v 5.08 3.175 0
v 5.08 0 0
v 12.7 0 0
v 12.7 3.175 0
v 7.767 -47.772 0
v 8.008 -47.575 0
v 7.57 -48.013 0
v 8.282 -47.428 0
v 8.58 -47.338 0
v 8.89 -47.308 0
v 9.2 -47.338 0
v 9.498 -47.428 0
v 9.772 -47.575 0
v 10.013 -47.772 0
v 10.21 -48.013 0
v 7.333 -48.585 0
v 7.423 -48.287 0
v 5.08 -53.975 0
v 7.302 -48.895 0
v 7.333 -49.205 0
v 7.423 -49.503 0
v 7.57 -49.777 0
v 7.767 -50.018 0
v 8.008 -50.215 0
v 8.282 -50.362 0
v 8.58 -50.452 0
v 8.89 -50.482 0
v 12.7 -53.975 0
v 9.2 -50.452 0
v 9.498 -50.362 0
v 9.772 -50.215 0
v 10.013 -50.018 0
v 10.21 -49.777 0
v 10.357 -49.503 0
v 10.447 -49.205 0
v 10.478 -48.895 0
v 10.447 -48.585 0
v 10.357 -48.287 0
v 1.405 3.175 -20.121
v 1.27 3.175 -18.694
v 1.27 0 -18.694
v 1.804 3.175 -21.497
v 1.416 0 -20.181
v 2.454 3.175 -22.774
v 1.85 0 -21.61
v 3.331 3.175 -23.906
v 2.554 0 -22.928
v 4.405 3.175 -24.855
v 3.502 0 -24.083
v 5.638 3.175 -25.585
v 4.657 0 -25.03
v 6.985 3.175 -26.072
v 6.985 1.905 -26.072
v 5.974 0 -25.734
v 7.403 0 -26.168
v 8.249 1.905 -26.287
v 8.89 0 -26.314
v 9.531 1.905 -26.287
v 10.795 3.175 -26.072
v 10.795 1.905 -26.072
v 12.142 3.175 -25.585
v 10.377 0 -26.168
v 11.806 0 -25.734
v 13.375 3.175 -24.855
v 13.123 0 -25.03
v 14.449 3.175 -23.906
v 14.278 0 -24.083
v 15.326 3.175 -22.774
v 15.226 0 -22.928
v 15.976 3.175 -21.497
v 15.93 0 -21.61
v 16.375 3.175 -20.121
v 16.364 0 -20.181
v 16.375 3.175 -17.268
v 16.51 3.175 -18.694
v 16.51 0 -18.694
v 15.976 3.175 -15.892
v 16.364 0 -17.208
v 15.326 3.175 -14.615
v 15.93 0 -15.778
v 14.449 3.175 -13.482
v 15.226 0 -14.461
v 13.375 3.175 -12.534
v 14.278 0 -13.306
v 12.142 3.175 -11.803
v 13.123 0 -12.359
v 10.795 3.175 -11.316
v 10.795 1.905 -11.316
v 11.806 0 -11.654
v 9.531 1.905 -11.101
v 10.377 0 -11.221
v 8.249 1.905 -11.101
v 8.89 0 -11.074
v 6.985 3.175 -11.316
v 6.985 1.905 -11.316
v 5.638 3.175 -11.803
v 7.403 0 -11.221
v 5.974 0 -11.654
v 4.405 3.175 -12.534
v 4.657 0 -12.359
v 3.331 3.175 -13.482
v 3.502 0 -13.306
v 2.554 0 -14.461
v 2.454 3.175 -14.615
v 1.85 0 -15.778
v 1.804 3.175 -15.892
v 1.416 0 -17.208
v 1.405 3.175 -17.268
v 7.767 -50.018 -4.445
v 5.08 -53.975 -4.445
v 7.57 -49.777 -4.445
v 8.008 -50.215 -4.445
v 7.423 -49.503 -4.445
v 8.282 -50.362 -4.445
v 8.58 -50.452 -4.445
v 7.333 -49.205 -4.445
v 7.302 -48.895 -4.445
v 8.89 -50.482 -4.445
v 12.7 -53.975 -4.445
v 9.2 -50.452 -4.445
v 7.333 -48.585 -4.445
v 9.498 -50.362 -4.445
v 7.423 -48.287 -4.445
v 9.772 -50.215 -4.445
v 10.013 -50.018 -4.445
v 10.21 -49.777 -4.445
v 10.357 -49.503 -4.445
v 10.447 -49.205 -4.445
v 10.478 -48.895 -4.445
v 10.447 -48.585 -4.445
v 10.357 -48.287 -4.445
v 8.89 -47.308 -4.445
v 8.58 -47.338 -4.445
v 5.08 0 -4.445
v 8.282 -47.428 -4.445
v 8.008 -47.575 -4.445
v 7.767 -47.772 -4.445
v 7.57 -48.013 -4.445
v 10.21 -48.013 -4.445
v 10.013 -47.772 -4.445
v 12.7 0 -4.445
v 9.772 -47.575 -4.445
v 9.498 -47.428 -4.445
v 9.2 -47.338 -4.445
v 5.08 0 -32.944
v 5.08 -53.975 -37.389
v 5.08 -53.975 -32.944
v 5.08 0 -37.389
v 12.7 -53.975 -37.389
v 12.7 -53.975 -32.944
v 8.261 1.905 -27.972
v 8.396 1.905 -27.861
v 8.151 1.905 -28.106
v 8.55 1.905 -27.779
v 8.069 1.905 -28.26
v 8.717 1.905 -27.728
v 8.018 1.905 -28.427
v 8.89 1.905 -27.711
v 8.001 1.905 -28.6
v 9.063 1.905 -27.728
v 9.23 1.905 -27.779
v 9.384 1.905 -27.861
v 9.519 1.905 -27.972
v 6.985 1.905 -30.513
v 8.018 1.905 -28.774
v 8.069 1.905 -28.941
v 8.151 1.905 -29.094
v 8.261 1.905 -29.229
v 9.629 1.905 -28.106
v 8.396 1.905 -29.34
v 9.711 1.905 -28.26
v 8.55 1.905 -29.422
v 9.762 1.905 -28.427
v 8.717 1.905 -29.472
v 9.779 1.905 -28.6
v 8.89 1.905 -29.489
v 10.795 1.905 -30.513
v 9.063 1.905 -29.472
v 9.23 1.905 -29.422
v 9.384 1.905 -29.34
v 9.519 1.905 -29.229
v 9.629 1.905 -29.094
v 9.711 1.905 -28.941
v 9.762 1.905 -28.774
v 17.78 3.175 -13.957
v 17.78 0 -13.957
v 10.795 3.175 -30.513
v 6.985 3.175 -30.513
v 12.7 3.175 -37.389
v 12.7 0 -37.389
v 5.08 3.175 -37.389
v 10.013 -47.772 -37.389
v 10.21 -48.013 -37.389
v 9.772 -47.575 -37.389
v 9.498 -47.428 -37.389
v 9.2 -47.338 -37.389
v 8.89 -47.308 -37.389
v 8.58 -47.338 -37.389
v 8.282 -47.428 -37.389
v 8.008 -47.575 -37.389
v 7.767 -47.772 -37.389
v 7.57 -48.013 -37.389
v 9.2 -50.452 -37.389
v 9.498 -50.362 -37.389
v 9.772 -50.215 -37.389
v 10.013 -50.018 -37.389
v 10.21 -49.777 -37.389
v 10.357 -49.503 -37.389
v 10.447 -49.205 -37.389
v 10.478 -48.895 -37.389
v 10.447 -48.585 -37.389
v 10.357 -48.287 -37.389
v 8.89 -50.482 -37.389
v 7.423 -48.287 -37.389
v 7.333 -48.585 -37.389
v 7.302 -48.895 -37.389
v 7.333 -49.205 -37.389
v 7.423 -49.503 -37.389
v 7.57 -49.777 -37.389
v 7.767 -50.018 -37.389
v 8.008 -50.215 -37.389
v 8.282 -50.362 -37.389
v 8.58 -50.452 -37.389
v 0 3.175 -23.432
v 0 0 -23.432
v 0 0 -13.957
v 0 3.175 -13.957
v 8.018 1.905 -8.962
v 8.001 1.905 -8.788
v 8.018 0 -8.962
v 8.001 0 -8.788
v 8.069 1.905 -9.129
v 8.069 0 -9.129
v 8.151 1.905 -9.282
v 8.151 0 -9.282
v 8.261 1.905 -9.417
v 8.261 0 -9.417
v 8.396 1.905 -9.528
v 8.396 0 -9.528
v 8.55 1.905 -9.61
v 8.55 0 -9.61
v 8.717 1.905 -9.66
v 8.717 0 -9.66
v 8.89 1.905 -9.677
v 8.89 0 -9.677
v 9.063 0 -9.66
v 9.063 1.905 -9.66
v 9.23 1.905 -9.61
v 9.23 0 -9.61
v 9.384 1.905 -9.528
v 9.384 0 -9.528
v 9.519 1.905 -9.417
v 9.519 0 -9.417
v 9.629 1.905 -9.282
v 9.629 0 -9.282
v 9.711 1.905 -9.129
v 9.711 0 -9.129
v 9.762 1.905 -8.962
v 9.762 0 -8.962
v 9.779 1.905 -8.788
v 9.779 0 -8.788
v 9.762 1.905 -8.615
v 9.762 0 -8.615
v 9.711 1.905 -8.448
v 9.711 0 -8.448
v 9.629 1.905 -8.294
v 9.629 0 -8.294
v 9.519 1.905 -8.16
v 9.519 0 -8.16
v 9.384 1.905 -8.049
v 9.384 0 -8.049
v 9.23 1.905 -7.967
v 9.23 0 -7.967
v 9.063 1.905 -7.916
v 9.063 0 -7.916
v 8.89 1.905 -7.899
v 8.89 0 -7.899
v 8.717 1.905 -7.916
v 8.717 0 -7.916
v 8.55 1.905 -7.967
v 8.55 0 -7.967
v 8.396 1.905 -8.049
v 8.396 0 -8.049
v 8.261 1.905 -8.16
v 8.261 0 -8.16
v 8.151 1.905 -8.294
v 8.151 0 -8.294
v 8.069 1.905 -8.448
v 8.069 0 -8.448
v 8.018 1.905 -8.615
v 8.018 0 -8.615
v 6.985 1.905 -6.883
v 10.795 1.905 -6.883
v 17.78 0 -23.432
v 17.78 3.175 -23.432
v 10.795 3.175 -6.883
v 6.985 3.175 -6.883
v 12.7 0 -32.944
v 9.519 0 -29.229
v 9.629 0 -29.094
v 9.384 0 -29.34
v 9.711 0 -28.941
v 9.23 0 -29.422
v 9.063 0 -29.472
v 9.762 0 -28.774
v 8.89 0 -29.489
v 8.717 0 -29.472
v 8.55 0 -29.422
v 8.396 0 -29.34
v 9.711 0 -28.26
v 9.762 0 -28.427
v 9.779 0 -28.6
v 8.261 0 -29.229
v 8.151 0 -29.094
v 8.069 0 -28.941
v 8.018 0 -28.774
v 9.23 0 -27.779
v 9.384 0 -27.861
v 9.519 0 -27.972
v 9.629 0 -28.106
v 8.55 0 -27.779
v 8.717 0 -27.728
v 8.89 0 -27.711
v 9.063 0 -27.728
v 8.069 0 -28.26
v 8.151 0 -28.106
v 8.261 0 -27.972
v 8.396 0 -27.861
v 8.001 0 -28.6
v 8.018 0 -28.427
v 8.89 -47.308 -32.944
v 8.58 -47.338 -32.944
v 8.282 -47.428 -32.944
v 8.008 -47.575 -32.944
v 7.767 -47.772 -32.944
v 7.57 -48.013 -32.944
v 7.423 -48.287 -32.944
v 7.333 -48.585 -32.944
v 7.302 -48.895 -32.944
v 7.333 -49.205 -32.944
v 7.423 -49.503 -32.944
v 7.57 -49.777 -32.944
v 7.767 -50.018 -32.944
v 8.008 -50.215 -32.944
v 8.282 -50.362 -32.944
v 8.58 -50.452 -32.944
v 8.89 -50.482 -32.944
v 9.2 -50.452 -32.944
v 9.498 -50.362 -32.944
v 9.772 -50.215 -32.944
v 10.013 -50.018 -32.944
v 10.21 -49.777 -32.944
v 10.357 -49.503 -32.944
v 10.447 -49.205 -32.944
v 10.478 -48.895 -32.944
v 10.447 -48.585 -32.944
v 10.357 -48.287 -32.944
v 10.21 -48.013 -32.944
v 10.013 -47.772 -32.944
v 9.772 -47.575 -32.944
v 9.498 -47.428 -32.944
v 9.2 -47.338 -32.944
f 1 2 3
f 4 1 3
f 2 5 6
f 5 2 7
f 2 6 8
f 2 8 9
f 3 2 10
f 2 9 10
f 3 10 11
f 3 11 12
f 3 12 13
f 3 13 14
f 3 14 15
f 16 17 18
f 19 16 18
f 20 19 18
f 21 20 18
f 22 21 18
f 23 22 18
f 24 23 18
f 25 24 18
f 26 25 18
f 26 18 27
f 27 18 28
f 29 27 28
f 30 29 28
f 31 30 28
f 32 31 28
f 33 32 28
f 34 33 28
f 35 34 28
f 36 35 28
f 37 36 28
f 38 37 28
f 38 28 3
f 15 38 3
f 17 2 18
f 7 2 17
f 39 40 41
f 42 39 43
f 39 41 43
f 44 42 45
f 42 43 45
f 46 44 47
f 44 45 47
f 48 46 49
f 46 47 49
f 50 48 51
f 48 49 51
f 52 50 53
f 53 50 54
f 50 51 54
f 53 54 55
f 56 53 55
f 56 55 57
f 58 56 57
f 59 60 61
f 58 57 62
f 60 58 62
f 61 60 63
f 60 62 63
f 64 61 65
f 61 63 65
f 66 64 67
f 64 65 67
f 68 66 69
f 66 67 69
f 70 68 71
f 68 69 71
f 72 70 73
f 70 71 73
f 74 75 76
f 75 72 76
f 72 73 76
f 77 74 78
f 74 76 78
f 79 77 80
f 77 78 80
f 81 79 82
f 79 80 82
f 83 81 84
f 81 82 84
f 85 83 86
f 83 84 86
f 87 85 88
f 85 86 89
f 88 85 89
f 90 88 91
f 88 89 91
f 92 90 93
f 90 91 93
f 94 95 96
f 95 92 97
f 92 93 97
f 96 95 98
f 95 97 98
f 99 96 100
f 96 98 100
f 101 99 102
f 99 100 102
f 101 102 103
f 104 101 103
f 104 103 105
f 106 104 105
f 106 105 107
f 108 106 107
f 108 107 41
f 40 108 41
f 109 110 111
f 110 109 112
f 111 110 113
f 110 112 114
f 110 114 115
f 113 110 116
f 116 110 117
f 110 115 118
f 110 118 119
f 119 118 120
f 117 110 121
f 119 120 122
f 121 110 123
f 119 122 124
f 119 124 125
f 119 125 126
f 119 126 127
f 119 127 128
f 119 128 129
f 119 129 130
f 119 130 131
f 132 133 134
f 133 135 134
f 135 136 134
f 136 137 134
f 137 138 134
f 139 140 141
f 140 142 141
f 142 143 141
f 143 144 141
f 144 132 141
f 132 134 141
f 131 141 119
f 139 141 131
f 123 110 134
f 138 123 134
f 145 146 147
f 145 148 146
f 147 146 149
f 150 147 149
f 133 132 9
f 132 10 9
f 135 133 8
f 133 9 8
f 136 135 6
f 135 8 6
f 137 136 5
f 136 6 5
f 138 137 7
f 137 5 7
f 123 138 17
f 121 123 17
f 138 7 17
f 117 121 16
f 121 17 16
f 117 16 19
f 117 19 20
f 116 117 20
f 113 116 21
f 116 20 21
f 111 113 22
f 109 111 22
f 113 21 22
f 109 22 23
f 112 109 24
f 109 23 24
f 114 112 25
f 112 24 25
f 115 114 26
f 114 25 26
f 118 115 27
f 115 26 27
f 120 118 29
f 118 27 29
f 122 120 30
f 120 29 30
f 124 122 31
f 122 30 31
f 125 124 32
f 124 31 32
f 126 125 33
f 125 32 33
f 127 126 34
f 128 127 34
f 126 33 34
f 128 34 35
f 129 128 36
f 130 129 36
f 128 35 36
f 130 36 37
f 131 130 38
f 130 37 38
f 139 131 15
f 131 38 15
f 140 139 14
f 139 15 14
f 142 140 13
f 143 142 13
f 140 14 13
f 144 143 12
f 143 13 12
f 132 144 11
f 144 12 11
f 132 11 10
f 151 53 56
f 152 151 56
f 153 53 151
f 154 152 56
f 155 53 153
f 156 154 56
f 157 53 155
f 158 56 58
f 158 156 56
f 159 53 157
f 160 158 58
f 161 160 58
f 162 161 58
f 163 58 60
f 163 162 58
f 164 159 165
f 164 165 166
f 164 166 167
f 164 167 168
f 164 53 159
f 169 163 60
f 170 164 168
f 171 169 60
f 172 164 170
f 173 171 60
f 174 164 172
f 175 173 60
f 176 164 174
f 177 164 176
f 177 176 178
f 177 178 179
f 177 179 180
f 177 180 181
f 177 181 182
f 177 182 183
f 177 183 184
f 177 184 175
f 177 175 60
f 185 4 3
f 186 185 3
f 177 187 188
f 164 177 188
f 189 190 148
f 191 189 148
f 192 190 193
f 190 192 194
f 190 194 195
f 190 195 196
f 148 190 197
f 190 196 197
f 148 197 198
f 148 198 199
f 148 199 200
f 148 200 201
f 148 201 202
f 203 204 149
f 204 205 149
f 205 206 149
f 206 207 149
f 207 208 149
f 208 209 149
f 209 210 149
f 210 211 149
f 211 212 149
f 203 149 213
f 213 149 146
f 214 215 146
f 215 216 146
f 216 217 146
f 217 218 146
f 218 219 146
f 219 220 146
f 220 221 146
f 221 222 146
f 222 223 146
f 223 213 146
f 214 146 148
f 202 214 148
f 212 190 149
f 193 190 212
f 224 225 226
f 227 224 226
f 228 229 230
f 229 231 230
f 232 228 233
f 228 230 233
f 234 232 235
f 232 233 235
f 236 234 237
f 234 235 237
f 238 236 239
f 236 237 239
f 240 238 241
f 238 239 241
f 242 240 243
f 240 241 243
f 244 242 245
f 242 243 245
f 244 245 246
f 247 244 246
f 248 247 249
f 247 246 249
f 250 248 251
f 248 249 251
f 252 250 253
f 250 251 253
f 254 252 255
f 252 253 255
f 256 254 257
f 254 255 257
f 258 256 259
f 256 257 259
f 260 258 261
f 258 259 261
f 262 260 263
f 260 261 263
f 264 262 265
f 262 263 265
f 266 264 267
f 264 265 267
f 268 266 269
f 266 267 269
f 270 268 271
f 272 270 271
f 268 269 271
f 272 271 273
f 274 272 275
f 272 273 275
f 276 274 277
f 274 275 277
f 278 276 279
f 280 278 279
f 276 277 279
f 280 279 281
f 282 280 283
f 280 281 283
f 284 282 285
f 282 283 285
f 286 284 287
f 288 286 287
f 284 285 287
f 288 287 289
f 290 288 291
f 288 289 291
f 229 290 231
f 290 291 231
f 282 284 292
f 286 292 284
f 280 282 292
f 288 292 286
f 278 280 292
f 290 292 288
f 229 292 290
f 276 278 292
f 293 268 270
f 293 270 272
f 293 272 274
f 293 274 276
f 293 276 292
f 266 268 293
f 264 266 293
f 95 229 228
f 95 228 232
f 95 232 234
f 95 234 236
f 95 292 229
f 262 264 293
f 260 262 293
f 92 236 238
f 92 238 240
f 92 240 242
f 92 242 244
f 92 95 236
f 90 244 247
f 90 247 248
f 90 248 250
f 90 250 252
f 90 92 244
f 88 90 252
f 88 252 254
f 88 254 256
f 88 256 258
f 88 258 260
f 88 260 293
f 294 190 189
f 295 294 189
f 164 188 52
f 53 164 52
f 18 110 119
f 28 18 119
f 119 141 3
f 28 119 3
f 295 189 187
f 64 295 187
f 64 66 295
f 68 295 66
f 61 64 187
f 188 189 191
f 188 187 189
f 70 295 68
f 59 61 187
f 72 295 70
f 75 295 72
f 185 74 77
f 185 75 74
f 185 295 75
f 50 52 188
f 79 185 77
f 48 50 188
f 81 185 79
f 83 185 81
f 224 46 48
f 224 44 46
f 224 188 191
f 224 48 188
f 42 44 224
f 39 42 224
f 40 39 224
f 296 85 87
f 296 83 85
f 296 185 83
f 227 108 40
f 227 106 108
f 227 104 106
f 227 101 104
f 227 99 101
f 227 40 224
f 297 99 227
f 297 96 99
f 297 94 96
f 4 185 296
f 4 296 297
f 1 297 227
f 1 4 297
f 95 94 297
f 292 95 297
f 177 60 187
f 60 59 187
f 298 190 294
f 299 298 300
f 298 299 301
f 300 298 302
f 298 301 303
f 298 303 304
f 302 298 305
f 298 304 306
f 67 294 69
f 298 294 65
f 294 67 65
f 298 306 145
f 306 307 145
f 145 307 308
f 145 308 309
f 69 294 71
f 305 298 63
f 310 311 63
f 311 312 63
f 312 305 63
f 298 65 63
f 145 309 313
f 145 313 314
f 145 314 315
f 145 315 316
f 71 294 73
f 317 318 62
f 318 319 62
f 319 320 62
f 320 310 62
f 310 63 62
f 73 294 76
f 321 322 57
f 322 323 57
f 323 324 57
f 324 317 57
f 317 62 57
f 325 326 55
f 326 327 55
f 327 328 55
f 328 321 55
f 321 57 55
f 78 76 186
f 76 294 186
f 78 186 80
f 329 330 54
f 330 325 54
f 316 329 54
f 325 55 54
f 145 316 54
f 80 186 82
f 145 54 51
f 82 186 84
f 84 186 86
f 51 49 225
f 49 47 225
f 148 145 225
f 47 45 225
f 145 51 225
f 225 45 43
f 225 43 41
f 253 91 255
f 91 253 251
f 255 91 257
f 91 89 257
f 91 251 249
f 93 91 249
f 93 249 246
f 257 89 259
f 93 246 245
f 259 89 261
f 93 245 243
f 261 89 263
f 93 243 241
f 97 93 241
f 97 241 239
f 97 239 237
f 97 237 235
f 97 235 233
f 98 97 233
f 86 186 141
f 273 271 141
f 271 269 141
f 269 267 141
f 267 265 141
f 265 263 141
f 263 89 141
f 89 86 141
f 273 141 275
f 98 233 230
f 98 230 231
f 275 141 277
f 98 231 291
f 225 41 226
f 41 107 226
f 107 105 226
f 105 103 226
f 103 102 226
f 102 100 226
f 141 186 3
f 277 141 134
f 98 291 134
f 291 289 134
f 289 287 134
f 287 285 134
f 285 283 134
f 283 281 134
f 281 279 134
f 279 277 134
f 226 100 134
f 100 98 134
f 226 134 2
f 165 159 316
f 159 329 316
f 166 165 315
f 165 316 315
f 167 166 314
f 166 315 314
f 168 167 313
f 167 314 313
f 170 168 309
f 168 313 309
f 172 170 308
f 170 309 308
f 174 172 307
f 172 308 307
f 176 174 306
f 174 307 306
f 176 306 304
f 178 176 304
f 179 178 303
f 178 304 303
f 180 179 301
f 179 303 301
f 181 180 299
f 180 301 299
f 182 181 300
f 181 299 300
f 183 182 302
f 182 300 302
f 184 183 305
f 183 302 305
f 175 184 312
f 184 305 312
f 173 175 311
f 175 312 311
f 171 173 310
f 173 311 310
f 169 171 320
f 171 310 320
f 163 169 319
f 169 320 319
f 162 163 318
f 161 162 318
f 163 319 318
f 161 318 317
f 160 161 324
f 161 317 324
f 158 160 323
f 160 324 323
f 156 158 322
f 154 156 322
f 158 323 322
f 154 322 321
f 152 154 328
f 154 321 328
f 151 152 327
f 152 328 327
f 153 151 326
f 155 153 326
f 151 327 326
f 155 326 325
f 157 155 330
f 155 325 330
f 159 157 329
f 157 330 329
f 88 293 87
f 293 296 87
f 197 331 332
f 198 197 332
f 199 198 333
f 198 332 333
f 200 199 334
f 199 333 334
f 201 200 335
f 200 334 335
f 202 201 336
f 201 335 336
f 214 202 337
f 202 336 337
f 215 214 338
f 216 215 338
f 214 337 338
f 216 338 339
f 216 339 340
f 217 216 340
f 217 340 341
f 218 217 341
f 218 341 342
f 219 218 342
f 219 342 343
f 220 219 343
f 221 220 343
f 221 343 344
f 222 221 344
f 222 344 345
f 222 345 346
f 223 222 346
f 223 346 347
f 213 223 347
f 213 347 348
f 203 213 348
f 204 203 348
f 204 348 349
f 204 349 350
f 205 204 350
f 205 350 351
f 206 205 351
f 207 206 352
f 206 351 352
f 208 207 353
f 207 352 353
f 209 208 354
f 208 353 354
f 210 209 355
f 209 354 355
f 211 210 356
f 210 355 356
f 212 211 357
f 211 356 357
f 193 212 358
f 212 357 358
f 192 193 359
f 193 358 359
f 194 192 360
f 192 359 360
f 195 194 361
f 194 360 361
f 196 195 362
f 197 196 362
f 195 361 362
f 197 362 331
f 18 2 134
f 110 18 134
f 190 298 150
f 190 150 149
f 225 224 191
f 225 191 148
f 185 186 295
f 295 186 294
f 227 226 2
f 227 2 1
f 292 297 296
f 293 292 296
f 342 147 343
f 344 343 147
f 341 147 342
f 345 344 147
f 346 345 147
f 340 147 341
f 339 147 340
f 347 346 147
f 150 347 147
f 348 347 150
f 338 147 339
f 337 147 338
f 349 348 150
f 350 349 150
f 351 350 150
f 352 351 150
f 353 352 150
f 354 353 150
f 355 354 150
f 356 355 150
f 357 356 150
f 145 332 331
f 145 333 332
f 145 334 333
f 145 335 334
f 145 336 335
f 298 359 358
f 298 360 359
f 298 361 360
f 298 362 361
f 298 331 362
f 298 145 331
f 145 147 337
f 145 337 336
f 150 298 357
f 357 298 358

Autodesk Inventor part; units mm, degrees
ref_plane "YZ Plane" through (0, 0, 0) normal (1, 0, 0) x (0, 1, 0)
ref_plane "XZ Plane" through (0, 0, 0) normal (0, 1, 0) x (-1, 0, 0)
ref_plane "XY Plane" through (0, 0, 0) normal (0, 0, 1) x (1, 0, 0)
sketch "Sketch1" plane through (0, 0, 0) normal (0, 1, 0) x (-1, 0, 0)
  line L0 (0, 0) -> (-17.78, 0)
  line L1 (-17.78, 0) -> (-17.78, -37.3888)
  line L2 (-17.78, -37.3888) -> (0, -37.3888)
  line L3 (0, -37.3888) -> (0, 0)
  circle A0 centre (-8.89, -18.6944) radius 7.62
  line L4 (0, -18.6944) -> (-17.78, -18.6944) construction
  line L5 (-8.89, -37.3888) -> (-8.89, 0) construction
  circle A1 centre (-8.89, -28.6004) radius 0.889
  circle A2 centre (-8.89, -8.7884) radius 0.889
  dimension "d0" = 37.3888
  dimension "d1" = 17.78
  dimension "d2" = 15.24
  dimension "d3" = 1.778
  dimension "d4" = 19.812
extrude "Extrusion1" add sketch "Sketch1" along normal blind 3.175
sketch "Sketch2" plane through (0, 3.175, 0) normal (0, 1, 0) x (1, 0, 0)
  line L0 (6.985, 6.8834) -> (10.795, 6.8834)
  line L1 (10.795, 6.8834) -> (10.795, 12.3482)
  line L2 (10.795, 12.3482) -> (6.985, 12.3482)
  line L3 (6.985, 12.3482) -> (6.985, 6.8834)
  circle A0 centre (8.89, 8.7884) radius 0.889 construction
  line L4 (8.89, 8.7884) -> (8.001, 8.7884) construction
  line L5 (8.89, 8.7884) -> (8.89, 9.6774) construction
  line L6 (6.985, 25.0482) -> (10.795, 25.0482)
  line L7 (10.795, 25.0482) -> (10.795, 30.513)
  line L8 (10.795, 30.513) -> (6.985, 30.513)
  line L9 (6.985, 30.513) -> (6.985, 25.0482)
  circle A1 centre (8.89, 28.6004) radius 0.889 construction
  line L10 (8.001, 28.6004) -> (8.89, 28.6004) construction
  point P0 (0, 0)
  point P1 (8.4455, 8.7884)
  point P2 (8.4455, 28.6004)
  dimension "d8" = 3.81
  dimension "d11" = 1.905
  dimension "d12" = 1.9126
  dimension "d13" = 12.7
extrude "Extrusion2" cut sketch "Sketch2" against normal blind 1.27
sketch "Sketch3" plane through (0, 3.175, 0) normal (0, 1, 0) x (1, 0, 0)
  line L0 (17.78, 37.3888) -> (0, 37.3888) projected
  line L1 (12.7, 37.3888) -> (5.08, 37.3888)
  line L2 (5.08, 37.3888) -> (5.08, 32.9438)
  line L3 (5.08, 32.9438) -> (12.7, 32.9438)
  line L4 (12.7, 32.9438) -> (12.7, 37.3888)
  line L5 (0, 0) -> (17.78, 0) projected
  line L6 (12.7, 0) -> (5.08, 0)
  line L7 (5.08, 0) -> (5.08, 4.445)
  line L8 (5.08, 4.445) -> (12.7, 4.445)
  line L9 (12.7, 4.445) -> (12.7, 0)
  line L10 (17.78, 0) -> (17.78, 37.3888) construction
  line L11 (17.78, 18.6944) -> (0, 18.6944) construction
  line L12 (0, 37.3888) -> (0, 0) construction
  circle A0 centre (8.89, 18.6944) radius 7.62 construction
  line L13 (8.89, 18.6944) -> (8.89, 11.0744) construction
  point P0 (8.89, 4.445)
  point P1 (5.08, 37.3888)
  dimension "d14" = 28.4988
  dimension "d15" = 7.62
extrude "Extrusion3" add sketch "Sketch3" against normal blind 57.15
sketch "Sketch4" plane through (17.78, 3.175, -37.3888) normal (0, 0, -1) x (-1, 0, 0)
  line L0 (12.7, -57.15) -> (5.08, -57.15) projected
  line L1 (12.7, -3.175) -> (12.7, -57.15) projected
  point P0 (17.78, -3.175)
  point P1 (8.89, -52.07)
  dimension "d18" = 5.08
  dimension "d19" = 3.81
hole "Hole1" at (8.89, -48.895, -37.3888) direction (0, 0, 1) diameter 3.175 depth 37.3888
chamfer "Chamfer1" distance 5.08 angle 70 1 edges at (17.78, 1.5875, -37.3888) measured on face at (8.89, -15.7692, -37.3888)
chamfer "Chamfer2" distance 5.08 angle 70 1 edges at (0, 1.5875, -37.3888) measured on face at (8.89, -15.7692, -37.3888)
chamfer "Chamfer3" distance 5.08 angle 70 1 edges at (17.78, 1.5875, 0) measured on face at (8.89, -15.7692, 0)
chamfer "Chamfer4" distance 5.08 angle 70 1 edges at (0, 1.5875, 0) measured on face at (8.89, -15.7692, 0)
properties part number "m500 hires mount"
